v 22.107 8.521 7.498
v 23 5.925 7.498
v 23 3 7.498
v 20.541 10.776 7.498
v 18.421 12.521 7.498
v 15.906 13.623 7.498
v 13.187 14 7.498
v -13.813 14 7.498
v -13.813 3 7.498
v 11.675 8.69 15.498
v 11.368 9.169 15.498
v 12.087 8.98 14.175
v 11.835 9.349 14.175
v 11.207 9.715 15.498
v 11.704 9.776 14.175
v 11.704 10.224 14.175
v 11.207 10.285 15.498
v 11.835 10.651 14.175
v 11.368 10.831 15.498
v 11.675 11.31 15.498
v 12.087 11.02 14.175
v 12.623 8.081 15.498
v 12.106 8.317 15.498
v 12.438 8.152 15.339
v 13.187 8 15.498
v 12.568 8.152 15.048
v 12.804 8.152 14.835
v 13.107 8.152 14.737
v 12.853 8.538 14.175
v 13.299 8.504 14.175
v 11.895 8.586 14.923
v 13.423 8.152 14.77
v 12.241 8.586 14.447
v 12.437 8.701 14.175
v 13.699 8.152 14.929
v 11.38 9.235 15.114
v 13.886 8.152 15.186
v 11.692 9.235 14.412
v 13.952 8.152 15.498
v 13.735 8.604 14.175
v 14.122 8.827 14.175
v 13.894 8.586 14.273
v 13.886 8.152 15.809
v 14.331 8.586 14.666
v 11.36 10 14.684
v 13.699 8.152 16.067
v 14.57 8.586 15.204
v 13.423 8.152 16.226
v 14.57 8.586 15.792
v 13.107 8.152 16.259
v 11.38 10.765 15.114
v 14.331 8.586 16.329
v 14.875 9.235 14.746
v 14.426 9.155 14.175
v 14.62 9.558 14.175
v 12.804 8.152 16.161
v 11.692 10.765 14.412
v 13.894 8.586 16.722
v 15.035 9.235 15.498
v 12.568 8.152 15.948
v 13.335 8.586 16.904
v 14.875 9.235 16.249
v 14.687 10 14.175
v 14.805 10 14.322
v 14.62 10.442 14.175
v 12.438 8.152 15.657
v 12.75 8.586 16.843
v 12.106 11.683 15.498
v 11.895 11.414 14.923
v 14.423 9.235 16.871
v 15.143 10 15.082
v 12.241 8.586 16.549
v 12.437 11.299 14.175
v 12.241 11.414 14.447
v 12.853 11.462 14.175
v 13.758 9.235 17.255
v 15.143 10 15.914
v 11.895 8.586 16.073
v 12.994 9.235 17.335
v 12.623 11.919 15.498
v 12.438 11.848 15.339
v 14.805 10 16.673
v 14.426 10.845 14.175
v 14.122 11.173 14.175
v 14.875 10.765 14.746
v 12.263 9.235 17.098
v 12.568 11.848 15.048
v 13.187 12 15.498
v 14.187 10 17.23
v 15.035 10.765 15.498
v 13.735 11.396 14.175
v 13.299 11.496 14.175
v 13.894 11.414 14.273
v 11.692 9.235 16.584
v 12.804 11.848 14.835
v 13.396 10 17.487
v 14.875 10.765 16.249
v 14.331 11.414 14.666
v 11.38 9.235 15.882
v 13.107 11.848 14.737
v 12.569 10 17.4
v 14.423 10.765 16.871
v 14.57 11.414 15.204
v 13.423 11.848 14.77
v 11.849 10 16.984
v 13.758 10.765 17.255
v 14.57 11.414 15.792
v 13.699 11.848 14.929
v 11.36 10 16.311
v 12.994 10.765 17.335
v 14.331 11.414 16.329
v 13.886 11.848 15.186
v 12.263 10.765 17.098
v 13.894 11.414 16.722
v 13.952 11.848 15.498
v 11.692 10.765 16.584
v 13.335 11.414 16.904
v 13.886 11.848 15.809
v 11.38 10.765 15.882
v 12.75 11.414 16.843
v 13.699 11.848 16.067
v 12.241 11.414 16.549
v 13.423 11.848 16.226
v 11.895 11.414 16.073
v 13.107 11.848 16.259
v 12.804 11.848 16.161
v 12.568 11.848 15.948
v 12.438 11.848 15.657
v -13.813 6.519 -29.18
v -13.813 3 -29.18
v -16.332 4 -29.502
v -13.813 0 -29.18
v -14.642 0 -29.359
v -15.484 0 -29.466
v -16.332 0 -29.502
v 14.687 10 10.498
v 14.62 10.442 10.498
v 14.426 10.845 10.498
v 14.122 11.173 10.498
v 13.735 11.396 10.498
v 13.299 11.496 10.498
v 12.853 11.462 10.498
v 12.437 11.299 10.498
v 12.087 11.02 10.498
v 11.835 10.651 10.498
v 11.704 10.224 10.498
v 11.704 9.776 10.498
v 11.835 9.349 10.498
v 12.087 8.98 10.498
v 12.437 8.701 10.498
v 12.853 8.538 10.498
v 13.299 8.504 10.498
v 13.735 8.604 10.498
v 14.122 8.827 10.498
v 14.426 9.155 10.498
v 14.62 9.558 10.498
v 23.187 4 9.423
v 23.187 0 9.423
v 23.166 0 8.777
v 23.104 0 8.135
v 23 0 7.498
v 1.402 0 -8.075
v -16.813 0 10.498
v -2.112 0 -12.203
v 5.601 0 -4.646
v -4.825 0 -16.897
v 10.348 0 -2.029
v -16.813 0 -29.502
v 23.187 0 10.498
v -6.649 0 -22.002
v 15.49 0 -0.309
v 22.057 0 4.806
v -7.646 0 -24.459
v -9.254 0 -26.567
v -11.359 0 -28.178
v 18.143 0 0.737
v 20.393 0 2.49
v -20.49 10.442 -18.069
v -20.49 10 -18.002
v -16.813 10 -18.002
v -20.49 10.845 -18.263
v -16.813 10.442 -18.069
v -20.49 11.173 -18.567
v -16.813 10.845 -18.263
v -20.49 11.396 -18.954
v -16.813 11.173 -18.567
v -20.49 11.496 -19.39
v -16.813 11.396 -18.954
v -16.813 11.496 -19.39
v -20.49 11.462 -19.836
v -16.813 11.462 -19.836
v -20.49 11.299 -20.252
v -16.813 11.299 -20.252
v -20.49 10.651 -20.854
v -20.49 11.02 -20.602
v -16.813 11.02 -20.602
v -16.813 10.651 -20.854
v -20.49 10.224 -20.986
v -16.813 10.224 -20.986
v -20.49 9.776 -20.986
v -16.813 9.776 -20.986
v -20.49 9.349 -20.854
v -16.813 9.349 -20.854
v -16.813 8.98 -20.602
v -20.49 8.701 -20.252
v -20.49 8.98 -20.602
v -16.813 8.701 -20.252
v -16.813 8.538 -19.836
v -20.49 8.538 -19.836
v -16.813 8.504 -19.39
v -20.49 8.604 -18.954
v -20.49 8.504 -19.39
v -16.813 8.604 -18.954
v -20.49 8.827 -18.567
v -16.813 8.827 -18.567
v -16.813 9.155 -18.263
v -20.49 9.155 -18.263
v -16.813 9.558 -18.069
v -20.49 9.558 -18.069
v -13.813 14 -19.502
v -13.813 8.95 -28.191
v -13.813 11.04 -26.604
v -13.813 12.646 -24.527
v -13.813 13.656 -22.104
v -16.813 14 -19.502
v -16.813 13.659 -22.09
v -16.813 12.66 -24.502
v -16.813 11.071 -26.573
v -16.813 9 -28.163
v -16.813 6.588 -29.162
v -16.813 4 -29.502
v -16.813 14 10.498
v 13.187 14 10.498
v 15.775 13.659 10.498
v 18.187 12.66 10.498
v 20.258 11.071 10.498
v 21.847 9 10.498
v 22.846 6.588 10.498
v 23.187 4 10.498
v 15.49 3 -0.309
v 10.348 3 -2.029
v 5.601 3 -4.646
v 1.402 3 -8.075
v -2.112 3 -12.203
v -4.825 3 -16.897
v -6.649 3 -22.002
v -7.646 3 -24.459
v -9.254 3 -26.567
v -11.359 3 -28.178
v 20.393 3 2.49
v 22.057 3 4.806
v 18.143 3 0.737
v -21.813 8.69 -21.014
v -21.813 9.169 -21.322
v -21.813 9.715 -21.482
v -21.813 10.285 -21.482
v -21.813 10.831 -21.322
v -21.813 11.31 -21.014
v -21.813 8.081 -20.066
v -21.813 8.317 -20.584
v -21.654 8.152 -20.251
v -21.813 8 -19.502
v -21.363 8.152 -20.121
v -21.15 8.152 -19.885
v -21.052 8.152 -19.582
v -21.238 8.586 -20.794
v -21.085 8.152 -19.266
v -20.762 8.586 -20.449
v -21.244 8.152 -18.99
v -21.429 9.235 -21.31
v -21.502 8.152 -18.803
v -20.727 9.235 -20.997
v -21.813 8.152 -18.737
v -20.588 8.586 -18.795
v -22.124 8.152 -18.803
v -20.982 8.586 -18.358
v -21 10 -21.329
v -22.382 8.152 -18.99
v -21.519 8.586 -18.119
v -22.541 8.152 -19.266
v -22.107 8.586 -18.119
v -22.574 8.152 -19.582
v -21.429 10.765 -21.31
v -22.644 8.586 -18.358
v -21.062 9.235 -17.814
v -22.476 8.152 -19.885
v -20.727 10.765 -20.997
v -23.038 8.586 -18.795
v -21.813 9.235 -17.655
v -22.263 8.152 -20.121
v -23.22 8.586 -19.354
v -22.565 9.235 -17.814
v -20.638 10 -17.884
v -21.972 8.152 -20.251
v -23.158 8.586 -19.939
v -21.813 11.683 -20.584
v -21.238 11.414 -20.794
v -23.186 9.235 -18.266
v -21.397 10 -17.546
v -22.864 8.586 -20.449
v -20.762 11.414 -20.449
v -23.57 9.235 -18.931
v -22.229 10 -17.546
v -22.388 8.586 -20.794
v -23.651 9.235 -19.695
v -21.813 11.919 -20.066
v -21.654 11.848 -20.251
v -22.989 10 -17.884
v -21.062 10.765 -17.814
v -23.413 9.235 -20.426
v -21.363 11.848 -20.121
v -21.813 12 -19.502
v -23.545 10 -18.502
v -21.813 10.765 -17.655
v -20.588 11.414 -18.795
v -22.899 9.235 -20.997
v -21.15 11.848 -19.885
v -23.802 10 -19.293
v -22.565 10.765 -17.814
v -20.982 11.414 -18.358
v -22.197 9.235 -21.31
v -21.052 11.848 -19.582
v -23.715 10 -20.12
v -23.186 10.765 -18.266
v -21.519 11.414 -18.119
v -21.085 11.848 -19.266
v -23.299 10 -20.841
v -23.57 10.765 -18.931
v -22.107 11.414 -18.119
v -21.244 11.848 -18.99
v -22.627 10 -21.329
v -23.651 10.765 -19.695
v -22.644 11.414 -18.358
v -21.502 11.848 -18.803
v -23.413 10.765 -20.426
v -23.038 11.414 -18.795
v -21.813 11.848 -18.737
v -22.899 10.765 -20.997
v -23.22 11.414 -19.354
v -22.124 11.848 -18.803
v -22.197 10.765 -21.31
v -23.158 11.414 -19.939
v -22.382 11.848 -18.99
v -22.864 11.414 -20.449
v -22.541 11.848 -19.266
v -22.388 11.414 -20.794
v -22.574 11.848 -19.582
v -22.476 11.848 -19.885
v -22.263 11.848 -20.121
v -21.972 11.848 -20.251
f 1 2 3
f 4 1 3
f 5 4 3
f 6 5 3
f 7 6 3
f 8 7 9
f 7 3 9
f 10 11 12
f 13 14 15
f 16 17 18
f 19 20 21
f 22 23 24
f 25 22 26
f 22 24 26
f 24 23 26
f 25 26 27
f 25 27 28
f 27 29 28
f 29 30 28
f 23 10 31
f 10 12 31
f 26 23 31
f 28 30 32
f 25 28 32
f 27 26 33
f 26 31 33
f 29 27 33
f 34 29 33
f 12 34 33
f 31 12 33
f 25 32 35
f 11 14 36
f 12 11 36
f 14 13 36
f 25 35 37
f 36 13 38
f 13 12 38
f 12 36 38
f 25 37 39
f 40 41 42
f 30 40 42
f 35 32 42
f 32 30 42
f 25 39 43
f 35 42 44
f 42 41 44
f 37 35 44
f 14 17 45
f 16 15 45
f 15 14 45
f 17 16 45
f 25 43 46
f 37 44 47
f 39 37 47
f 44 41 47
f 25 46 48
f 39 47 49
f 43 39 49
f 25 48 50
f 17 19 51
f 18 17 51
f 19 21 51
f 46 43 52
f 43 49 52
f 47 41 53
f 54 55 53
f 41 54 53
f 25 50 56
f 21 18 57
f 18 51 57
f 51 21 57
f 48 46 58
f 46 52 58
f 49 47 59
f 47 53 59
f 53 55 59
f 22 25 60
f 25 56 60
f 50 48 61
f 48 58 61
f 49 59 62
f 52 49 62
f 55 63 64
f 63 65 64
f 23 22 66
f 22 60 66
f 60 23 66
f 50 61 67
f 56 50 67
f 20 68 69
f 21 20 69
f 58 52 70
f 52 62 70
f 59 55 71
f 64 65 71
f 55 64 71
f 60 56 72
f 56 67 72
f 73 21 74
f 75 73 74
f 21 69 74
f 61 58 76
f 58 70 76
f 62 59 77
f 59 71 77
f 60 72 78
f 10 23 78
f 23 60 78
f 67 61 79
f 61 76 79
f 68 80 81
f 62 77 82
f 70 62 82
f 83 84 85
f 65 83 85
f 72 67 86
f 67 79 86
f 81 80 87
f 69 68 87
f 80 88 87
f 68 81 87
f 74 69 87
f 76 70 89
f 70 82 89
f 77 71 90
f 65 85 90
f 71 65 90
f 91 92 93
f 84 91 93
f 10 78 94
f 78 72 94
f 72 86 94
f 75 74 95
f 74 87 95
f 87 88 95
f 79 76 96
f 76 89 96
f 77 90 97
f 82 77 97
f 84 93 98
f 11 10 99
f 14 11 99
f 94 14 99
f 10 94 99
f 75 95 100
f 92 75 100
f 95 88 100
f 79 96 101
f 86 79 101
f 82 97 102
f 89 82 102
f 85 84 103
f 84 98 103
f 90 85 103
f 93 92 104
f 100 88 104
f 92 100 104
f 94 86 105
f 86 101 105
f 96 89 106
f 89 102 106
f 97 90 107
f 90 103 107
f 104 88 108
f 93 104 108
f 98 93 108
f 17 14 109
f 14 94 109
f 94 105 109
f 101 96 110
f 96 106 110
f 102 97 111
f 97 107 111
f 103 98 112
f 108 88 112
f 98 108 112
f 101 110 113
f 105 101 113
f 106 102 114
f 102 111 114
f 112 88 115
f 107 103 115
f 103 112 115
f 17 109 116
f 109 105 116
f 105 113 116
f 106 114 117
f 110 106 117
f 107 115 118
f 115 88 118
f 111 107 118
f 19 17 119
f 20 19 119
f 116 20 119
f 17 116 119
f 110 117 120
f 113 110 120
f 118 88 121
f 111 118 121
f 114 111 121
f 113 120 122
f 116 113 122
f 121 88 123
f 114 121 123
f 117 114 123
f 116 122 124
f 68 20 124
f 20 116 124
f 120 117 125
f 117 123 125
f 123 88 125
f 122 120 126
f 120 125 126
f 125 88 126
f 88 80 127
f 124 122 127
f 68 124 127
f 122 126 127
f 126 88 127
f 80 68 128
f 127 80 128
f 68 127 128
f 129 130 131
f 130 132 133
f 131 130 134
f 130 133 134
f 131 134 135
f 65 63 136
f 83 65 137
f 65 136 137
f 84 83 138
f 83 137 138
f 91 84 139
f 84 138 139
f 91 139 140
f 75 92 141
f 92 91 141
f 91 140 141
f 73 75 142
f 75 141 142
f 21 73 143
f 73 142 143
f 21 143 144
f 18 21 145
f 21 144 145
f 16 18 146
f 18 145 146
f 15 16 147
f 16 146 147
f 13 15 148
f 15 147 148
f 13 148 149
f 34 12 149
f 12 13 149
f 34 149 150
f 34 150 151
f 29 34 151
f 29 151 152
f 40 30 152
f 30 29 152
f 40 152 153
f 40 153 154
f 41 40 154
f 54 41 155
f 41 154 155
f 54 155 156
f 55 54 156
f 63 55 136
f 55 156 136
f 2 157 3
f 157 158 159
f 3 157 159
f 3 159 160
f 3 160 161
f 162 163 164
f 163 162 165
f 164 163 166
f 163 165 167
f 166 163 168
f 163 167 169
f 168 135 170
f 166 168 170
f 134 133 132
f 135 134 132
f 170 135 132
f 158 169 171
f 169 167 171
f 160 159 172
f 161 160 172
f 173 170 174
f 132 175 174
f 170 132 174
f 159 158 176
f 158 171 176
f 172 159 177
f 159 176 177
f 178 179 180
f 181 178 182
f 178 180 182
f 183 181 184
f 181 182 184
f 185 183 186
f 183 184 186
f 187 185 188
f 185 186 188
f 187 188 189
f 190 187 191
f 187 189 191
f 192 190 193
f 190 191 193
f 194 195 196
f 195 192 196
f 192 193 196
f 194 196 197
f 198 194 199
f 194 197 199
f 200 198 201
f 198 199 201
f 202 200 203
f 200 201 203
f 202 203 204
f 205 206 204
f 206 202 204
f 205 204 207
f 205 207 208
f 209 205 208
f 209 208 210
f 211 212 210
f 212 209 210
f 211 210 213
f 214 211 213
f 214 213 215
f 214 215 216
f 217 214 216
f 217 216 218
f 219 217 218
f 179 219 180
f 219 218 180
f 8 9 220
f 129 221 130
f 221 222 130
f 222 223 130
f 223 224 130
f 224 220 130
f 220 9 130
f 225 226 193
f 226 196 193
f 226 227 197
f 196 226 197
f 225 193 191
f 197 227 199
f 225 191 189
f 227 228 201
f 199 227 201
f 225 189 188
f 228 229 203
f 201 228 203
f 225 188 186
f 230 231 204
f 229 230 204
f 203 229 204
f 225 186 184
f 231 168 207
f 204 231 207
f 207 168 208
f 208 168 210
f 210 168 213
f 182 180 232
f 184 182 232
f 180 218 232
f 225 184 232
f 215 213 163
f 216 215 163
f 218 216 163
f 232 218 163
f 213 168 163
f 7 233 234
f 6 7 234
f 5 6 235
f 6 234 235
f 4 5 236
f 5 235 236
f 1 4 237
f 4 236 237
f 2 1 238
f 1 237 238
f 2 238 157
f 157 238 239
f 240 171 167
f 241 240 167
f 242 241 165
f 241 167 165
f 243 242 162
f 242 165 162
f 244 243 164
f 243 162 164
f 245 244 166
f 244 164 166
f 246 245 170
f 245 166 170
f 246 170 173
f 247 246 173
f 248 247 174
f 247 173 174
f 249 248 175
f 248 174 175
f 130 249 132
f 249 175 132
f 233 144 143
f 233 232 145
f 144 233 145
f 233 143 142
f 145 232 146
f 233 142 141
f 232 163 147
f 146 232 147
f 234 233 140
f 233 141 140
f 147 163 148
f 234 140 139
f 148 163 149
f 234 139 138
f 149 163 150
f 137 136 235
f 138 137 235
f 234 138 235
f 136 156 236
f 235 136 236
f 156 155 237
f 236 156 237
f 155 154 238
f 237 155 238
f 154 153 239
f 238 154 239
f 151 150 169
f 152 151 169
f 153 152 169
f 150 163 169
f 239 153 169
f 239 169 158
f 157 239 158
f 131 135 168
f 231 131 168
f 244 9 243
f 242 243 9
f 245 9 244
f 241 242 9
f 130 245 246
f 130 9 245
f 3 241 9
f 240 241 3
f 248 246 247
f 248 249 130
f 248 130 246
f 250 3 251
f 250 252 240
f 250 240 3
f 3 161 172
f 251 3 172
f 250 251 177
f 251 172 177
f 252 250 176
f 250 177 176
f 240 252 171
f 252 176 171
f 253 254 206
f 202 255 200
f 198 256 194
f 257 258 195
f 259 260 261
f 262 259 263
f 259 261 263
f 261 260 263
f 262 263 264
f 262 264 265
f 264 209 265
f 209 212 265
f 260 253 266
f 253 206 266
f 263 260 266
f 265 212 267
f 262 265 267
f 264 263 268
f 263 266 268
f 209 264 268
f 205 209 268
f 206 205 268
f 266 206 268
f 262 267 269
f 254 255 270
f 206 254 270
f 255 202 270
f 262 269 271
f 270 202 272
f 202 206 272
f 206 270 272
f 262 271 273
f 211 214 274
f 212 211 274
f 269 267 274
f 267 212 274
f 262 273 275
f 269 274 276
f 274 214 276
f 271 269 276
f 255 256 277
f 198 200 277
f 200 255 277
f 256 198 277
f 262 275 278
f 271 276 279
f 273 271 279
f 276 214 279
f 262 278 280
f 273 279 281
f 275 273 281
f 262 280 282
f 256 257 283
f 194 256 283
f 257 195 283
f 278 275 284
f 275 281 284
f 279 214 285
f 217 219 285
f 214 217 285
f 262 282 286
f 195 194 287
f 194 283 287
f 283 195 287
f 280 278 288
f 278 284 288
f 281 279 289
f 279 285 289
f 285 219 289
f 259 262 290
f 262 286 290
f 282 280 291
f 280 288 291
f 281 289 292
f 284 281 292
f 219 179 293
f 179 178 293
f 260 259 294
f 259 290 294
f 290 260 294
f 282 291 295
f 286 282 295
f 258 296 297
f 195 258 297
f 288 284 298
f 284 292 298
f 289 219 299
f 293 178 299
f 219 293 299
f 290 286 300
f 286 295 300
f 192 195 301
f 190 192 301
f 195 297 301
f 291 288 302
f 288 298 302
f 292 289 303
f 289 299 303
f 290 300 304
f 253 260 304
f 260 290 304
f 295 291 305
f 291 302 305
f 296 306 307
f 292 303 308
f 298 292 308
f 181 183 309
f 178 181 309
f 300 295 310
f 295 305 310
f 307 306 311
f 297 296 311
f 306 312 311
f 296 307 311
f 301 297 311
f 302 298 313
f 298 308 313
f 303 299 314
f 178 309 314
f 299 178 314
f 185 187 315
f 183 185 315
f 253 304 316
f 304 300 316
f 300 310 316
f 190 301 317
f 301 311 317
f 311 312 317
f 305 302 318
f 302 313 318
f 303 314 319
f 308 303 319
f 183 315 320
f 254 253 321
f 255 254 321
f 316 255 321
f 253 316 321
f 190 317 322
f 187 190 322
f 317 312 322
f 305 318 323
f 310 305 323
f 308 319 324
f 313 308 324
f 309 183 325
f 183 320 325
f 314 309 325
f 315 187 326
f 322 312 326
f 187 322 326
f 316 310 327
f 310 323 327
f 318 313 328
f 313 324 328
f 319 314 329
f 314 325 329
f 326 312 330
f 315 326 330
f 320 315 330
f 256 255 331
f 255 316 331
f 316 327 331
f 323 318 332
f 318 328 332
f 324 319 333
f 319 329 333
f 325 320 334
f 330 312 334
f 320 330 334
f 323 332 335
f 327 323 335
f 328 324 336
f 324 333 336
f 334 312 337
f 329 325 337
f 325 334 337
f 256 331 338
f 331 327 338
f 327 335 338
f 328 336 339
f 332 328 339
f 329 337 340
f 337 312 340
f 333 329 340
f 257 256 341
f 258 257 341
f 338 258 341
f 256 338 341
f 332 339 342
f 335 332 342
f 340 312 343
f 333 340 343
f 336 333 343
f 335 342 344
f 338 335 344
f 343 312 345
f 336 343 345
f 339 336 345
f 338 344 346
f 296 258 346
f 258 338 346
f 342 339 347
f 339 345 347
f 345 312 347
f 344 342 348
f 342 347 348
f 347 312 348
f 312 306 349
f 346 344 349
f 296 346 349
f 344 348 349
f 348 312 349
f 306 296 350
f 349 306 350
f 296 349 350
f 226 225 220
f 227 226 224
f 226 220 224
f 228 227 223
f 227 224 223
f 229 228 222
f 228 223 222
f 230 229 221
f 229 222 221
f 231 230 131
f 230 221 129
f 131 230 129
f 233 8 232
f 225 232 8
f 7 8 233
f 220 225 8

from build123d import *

# Parameters (mm, degrees)
BOSS_EXTRUDE2_DEPTH = 3
BOSS_EXTRUDE3_DEPTH = 14
FILLET2_R           = 10
SKETCH3_R           = 1.5
BOSS_EXTRUDE4_DEPTH = 5
SKETCH2_R           = 1.5
BOSS_EXTRUDE5_DEPTH = 5


with BuildPart() as part:
    # Sketch1 → Boss-Extrude2 (new body)
    with BuildSketch(Plane(origin=(0, 0, 0), x_dir=(1, 0, 0), z_dir=(0, 1, 0))):
        with BuildLine():
            Line((-13.813102114, 29.179914519), (-13.813102114, -7.497737557))
            Line((-13.813102114, -7.497737557), (22.999876511, -7.497737557))
            ThreePointArc((22.999876511, -7.497737557), (20.393331118, -2.4896323), (15.489720926, 0.308546434))
            ThreePointArc((15.489720926, 0.308546434), (1.40152336, 8.074710364), (-6.649185051, 22.002262443))
            ThreePointArc((-6.649185051, 22.002262443), (-9.253806843, 26.566555008), (-13.813102114, 29.179914519))
        make_face()
        with BuildLine():
            Line((22.999876511, -7.497737557), (-13.813102114, -7.497737557))
            Line((-13.813102114, -7.497737557), (-13.813102114, 29.179914519))
            ThreePointArc((-13.813102114, 29.179914519), (-15.062100342, 29.421348106), (-16.331643417, 29.502262443))
            Line((-16.331643417, 29.502262443), (-16.813102114, 29.502262443))
            Line((-16.813102114, 29.502262443), (-16.813102114, -10.497737557))
            Line((-16.813102114, -10.497737557), (23.186897886, -10.497737557))
            Line((23.186897886, -10.497737557), (23.186897886, -9.422692236))
            ThreePointArc((23.186897886, -9.422692236), (23.140032725, -8.455682992), (22.999876511, -7.497737557))
        make_face()
    extrude(amount=BOSS_EXTRUDE2_DEPTH)

    # Sketch1<4> → Boss-Extrude3 (add)
    with BuildSketch(Plane(origin=(0, 0, 0), x_dir=(1, 0, 0), z_dir=(0, 1, 0))):
        with BuildLine():
            Line((22.999876511, -7.497737557), (-13.813102114, -7.497737557))
            Line((-13.813102114, -7.497737557), (-13.813102114, 29.179914519))
            ThreePointArc((-13.813102114, 29.179914519), (-15.062100342, 29.421348106), (-16.331643417, 29.502262443))
            Line((-16.331643417, 29.502262443), (-16.813102114, 29.502262443))
            Line((-16.813102114, 29.502262443), (-16.813102114, -10.497737557))
            Line((-16.813102114, -10.497737557), (23.186897886, -10.497737557))
            Line((23.186897886, -10.497737557), (23.186897886, -9.422692236))
            ThreePointArc((23.186897886, -9.422692236), (23.140032725, -8.455682992), (22.999876511, -7.497737557))
        make_face()
    extrude(amount=BOSS_EXTRUDE3_DEPTH)

    # Fillet2
    # the kernel refuses this fillet: 10 mm, written as the material it takes off along each edge
    with BuildSketch(Plane(origin=(8.668356583, 14, -29.502262443), x_dir=(0, -1, 0), z_dir=(-1, 0, 0))) as fillet2_piece_1:
        with BuildLine():
            CenterArc((FILLET2_R, FILLET2_R), FILLET2_R, 180, 90)
            Line((0, FILLET2_R), (0, 0))
            Line((0, 0), (FILLET2_R, 0))
        make_face()
    extrude(amount=50.481458697, mode=Mode.SUBTRACT)
    with BuildSketch(Plane(origin=(23.186897886, 14, 35.497737557), x_dir=(-1, 0, 0), z_dir=(0, 0, -1))) as fillet2_piece_2:
        with BuildLine():
            CenterArc((FILLET2_R, -FILLET2_R), FILLET2_R, 90, 90)
            Line((0, -FILLET2_R), (0, 0))
            Line((0, 0), (FILLET2_R, 0))
        make_face()
    extrude(amount=51.075045321, mode=Mode.SUBTRACT)

    # Sketch3 → Boss-Extrude4 (add)
    with BuildSketch(Plane.ZY.offset(16.813102114)):
        with Locations((-19.502262443, 10)):
            Circle(SKETCH3_R)
    extrude(amount=BOSS_EXTRUDE4_DEPTH)

    # Sketch4 → Revolve1 (revolve)
    with BuildSketch(Plane.ZY.offset(21.813102114)):
        with BuildLine():
            Line((-19.502262443, 12), (-19.502262443, 8))
            ThreePointArc((-19.502262443, 8), (-21.502262443, 10), (-19.502262443, 12))
        make_face()
    revolve(axis=Axis((-21.813102114, 12, -19.502262443), (0, -1, 0)))

    # Sketch2 → Boss-Extrude5 (add)
    with BuildSketch(Plane.XY.offset(10.497737557)):
        with Locations((13.186897886, 10)):
            Circle(SKETCH2_R)
    extrude(amount=BOSS_EXTRUDE5_DEPTH)

    # Sketch5 → Revolve2 (revolve)
    with BuildSketch(Plane.XY.offset(15.497737557)):
        with BuildLine():
            Line((13.186897886, 12), (13.186897886, 8))
            ThreePointArc((13.186897886, 8), (11.186897886, 10), (13.186897886, 12))
        make_face()
    revolve(axis=Axis((13.186897886, 12, 15.497737557), (0, -1, 0)))


solid = part.part
